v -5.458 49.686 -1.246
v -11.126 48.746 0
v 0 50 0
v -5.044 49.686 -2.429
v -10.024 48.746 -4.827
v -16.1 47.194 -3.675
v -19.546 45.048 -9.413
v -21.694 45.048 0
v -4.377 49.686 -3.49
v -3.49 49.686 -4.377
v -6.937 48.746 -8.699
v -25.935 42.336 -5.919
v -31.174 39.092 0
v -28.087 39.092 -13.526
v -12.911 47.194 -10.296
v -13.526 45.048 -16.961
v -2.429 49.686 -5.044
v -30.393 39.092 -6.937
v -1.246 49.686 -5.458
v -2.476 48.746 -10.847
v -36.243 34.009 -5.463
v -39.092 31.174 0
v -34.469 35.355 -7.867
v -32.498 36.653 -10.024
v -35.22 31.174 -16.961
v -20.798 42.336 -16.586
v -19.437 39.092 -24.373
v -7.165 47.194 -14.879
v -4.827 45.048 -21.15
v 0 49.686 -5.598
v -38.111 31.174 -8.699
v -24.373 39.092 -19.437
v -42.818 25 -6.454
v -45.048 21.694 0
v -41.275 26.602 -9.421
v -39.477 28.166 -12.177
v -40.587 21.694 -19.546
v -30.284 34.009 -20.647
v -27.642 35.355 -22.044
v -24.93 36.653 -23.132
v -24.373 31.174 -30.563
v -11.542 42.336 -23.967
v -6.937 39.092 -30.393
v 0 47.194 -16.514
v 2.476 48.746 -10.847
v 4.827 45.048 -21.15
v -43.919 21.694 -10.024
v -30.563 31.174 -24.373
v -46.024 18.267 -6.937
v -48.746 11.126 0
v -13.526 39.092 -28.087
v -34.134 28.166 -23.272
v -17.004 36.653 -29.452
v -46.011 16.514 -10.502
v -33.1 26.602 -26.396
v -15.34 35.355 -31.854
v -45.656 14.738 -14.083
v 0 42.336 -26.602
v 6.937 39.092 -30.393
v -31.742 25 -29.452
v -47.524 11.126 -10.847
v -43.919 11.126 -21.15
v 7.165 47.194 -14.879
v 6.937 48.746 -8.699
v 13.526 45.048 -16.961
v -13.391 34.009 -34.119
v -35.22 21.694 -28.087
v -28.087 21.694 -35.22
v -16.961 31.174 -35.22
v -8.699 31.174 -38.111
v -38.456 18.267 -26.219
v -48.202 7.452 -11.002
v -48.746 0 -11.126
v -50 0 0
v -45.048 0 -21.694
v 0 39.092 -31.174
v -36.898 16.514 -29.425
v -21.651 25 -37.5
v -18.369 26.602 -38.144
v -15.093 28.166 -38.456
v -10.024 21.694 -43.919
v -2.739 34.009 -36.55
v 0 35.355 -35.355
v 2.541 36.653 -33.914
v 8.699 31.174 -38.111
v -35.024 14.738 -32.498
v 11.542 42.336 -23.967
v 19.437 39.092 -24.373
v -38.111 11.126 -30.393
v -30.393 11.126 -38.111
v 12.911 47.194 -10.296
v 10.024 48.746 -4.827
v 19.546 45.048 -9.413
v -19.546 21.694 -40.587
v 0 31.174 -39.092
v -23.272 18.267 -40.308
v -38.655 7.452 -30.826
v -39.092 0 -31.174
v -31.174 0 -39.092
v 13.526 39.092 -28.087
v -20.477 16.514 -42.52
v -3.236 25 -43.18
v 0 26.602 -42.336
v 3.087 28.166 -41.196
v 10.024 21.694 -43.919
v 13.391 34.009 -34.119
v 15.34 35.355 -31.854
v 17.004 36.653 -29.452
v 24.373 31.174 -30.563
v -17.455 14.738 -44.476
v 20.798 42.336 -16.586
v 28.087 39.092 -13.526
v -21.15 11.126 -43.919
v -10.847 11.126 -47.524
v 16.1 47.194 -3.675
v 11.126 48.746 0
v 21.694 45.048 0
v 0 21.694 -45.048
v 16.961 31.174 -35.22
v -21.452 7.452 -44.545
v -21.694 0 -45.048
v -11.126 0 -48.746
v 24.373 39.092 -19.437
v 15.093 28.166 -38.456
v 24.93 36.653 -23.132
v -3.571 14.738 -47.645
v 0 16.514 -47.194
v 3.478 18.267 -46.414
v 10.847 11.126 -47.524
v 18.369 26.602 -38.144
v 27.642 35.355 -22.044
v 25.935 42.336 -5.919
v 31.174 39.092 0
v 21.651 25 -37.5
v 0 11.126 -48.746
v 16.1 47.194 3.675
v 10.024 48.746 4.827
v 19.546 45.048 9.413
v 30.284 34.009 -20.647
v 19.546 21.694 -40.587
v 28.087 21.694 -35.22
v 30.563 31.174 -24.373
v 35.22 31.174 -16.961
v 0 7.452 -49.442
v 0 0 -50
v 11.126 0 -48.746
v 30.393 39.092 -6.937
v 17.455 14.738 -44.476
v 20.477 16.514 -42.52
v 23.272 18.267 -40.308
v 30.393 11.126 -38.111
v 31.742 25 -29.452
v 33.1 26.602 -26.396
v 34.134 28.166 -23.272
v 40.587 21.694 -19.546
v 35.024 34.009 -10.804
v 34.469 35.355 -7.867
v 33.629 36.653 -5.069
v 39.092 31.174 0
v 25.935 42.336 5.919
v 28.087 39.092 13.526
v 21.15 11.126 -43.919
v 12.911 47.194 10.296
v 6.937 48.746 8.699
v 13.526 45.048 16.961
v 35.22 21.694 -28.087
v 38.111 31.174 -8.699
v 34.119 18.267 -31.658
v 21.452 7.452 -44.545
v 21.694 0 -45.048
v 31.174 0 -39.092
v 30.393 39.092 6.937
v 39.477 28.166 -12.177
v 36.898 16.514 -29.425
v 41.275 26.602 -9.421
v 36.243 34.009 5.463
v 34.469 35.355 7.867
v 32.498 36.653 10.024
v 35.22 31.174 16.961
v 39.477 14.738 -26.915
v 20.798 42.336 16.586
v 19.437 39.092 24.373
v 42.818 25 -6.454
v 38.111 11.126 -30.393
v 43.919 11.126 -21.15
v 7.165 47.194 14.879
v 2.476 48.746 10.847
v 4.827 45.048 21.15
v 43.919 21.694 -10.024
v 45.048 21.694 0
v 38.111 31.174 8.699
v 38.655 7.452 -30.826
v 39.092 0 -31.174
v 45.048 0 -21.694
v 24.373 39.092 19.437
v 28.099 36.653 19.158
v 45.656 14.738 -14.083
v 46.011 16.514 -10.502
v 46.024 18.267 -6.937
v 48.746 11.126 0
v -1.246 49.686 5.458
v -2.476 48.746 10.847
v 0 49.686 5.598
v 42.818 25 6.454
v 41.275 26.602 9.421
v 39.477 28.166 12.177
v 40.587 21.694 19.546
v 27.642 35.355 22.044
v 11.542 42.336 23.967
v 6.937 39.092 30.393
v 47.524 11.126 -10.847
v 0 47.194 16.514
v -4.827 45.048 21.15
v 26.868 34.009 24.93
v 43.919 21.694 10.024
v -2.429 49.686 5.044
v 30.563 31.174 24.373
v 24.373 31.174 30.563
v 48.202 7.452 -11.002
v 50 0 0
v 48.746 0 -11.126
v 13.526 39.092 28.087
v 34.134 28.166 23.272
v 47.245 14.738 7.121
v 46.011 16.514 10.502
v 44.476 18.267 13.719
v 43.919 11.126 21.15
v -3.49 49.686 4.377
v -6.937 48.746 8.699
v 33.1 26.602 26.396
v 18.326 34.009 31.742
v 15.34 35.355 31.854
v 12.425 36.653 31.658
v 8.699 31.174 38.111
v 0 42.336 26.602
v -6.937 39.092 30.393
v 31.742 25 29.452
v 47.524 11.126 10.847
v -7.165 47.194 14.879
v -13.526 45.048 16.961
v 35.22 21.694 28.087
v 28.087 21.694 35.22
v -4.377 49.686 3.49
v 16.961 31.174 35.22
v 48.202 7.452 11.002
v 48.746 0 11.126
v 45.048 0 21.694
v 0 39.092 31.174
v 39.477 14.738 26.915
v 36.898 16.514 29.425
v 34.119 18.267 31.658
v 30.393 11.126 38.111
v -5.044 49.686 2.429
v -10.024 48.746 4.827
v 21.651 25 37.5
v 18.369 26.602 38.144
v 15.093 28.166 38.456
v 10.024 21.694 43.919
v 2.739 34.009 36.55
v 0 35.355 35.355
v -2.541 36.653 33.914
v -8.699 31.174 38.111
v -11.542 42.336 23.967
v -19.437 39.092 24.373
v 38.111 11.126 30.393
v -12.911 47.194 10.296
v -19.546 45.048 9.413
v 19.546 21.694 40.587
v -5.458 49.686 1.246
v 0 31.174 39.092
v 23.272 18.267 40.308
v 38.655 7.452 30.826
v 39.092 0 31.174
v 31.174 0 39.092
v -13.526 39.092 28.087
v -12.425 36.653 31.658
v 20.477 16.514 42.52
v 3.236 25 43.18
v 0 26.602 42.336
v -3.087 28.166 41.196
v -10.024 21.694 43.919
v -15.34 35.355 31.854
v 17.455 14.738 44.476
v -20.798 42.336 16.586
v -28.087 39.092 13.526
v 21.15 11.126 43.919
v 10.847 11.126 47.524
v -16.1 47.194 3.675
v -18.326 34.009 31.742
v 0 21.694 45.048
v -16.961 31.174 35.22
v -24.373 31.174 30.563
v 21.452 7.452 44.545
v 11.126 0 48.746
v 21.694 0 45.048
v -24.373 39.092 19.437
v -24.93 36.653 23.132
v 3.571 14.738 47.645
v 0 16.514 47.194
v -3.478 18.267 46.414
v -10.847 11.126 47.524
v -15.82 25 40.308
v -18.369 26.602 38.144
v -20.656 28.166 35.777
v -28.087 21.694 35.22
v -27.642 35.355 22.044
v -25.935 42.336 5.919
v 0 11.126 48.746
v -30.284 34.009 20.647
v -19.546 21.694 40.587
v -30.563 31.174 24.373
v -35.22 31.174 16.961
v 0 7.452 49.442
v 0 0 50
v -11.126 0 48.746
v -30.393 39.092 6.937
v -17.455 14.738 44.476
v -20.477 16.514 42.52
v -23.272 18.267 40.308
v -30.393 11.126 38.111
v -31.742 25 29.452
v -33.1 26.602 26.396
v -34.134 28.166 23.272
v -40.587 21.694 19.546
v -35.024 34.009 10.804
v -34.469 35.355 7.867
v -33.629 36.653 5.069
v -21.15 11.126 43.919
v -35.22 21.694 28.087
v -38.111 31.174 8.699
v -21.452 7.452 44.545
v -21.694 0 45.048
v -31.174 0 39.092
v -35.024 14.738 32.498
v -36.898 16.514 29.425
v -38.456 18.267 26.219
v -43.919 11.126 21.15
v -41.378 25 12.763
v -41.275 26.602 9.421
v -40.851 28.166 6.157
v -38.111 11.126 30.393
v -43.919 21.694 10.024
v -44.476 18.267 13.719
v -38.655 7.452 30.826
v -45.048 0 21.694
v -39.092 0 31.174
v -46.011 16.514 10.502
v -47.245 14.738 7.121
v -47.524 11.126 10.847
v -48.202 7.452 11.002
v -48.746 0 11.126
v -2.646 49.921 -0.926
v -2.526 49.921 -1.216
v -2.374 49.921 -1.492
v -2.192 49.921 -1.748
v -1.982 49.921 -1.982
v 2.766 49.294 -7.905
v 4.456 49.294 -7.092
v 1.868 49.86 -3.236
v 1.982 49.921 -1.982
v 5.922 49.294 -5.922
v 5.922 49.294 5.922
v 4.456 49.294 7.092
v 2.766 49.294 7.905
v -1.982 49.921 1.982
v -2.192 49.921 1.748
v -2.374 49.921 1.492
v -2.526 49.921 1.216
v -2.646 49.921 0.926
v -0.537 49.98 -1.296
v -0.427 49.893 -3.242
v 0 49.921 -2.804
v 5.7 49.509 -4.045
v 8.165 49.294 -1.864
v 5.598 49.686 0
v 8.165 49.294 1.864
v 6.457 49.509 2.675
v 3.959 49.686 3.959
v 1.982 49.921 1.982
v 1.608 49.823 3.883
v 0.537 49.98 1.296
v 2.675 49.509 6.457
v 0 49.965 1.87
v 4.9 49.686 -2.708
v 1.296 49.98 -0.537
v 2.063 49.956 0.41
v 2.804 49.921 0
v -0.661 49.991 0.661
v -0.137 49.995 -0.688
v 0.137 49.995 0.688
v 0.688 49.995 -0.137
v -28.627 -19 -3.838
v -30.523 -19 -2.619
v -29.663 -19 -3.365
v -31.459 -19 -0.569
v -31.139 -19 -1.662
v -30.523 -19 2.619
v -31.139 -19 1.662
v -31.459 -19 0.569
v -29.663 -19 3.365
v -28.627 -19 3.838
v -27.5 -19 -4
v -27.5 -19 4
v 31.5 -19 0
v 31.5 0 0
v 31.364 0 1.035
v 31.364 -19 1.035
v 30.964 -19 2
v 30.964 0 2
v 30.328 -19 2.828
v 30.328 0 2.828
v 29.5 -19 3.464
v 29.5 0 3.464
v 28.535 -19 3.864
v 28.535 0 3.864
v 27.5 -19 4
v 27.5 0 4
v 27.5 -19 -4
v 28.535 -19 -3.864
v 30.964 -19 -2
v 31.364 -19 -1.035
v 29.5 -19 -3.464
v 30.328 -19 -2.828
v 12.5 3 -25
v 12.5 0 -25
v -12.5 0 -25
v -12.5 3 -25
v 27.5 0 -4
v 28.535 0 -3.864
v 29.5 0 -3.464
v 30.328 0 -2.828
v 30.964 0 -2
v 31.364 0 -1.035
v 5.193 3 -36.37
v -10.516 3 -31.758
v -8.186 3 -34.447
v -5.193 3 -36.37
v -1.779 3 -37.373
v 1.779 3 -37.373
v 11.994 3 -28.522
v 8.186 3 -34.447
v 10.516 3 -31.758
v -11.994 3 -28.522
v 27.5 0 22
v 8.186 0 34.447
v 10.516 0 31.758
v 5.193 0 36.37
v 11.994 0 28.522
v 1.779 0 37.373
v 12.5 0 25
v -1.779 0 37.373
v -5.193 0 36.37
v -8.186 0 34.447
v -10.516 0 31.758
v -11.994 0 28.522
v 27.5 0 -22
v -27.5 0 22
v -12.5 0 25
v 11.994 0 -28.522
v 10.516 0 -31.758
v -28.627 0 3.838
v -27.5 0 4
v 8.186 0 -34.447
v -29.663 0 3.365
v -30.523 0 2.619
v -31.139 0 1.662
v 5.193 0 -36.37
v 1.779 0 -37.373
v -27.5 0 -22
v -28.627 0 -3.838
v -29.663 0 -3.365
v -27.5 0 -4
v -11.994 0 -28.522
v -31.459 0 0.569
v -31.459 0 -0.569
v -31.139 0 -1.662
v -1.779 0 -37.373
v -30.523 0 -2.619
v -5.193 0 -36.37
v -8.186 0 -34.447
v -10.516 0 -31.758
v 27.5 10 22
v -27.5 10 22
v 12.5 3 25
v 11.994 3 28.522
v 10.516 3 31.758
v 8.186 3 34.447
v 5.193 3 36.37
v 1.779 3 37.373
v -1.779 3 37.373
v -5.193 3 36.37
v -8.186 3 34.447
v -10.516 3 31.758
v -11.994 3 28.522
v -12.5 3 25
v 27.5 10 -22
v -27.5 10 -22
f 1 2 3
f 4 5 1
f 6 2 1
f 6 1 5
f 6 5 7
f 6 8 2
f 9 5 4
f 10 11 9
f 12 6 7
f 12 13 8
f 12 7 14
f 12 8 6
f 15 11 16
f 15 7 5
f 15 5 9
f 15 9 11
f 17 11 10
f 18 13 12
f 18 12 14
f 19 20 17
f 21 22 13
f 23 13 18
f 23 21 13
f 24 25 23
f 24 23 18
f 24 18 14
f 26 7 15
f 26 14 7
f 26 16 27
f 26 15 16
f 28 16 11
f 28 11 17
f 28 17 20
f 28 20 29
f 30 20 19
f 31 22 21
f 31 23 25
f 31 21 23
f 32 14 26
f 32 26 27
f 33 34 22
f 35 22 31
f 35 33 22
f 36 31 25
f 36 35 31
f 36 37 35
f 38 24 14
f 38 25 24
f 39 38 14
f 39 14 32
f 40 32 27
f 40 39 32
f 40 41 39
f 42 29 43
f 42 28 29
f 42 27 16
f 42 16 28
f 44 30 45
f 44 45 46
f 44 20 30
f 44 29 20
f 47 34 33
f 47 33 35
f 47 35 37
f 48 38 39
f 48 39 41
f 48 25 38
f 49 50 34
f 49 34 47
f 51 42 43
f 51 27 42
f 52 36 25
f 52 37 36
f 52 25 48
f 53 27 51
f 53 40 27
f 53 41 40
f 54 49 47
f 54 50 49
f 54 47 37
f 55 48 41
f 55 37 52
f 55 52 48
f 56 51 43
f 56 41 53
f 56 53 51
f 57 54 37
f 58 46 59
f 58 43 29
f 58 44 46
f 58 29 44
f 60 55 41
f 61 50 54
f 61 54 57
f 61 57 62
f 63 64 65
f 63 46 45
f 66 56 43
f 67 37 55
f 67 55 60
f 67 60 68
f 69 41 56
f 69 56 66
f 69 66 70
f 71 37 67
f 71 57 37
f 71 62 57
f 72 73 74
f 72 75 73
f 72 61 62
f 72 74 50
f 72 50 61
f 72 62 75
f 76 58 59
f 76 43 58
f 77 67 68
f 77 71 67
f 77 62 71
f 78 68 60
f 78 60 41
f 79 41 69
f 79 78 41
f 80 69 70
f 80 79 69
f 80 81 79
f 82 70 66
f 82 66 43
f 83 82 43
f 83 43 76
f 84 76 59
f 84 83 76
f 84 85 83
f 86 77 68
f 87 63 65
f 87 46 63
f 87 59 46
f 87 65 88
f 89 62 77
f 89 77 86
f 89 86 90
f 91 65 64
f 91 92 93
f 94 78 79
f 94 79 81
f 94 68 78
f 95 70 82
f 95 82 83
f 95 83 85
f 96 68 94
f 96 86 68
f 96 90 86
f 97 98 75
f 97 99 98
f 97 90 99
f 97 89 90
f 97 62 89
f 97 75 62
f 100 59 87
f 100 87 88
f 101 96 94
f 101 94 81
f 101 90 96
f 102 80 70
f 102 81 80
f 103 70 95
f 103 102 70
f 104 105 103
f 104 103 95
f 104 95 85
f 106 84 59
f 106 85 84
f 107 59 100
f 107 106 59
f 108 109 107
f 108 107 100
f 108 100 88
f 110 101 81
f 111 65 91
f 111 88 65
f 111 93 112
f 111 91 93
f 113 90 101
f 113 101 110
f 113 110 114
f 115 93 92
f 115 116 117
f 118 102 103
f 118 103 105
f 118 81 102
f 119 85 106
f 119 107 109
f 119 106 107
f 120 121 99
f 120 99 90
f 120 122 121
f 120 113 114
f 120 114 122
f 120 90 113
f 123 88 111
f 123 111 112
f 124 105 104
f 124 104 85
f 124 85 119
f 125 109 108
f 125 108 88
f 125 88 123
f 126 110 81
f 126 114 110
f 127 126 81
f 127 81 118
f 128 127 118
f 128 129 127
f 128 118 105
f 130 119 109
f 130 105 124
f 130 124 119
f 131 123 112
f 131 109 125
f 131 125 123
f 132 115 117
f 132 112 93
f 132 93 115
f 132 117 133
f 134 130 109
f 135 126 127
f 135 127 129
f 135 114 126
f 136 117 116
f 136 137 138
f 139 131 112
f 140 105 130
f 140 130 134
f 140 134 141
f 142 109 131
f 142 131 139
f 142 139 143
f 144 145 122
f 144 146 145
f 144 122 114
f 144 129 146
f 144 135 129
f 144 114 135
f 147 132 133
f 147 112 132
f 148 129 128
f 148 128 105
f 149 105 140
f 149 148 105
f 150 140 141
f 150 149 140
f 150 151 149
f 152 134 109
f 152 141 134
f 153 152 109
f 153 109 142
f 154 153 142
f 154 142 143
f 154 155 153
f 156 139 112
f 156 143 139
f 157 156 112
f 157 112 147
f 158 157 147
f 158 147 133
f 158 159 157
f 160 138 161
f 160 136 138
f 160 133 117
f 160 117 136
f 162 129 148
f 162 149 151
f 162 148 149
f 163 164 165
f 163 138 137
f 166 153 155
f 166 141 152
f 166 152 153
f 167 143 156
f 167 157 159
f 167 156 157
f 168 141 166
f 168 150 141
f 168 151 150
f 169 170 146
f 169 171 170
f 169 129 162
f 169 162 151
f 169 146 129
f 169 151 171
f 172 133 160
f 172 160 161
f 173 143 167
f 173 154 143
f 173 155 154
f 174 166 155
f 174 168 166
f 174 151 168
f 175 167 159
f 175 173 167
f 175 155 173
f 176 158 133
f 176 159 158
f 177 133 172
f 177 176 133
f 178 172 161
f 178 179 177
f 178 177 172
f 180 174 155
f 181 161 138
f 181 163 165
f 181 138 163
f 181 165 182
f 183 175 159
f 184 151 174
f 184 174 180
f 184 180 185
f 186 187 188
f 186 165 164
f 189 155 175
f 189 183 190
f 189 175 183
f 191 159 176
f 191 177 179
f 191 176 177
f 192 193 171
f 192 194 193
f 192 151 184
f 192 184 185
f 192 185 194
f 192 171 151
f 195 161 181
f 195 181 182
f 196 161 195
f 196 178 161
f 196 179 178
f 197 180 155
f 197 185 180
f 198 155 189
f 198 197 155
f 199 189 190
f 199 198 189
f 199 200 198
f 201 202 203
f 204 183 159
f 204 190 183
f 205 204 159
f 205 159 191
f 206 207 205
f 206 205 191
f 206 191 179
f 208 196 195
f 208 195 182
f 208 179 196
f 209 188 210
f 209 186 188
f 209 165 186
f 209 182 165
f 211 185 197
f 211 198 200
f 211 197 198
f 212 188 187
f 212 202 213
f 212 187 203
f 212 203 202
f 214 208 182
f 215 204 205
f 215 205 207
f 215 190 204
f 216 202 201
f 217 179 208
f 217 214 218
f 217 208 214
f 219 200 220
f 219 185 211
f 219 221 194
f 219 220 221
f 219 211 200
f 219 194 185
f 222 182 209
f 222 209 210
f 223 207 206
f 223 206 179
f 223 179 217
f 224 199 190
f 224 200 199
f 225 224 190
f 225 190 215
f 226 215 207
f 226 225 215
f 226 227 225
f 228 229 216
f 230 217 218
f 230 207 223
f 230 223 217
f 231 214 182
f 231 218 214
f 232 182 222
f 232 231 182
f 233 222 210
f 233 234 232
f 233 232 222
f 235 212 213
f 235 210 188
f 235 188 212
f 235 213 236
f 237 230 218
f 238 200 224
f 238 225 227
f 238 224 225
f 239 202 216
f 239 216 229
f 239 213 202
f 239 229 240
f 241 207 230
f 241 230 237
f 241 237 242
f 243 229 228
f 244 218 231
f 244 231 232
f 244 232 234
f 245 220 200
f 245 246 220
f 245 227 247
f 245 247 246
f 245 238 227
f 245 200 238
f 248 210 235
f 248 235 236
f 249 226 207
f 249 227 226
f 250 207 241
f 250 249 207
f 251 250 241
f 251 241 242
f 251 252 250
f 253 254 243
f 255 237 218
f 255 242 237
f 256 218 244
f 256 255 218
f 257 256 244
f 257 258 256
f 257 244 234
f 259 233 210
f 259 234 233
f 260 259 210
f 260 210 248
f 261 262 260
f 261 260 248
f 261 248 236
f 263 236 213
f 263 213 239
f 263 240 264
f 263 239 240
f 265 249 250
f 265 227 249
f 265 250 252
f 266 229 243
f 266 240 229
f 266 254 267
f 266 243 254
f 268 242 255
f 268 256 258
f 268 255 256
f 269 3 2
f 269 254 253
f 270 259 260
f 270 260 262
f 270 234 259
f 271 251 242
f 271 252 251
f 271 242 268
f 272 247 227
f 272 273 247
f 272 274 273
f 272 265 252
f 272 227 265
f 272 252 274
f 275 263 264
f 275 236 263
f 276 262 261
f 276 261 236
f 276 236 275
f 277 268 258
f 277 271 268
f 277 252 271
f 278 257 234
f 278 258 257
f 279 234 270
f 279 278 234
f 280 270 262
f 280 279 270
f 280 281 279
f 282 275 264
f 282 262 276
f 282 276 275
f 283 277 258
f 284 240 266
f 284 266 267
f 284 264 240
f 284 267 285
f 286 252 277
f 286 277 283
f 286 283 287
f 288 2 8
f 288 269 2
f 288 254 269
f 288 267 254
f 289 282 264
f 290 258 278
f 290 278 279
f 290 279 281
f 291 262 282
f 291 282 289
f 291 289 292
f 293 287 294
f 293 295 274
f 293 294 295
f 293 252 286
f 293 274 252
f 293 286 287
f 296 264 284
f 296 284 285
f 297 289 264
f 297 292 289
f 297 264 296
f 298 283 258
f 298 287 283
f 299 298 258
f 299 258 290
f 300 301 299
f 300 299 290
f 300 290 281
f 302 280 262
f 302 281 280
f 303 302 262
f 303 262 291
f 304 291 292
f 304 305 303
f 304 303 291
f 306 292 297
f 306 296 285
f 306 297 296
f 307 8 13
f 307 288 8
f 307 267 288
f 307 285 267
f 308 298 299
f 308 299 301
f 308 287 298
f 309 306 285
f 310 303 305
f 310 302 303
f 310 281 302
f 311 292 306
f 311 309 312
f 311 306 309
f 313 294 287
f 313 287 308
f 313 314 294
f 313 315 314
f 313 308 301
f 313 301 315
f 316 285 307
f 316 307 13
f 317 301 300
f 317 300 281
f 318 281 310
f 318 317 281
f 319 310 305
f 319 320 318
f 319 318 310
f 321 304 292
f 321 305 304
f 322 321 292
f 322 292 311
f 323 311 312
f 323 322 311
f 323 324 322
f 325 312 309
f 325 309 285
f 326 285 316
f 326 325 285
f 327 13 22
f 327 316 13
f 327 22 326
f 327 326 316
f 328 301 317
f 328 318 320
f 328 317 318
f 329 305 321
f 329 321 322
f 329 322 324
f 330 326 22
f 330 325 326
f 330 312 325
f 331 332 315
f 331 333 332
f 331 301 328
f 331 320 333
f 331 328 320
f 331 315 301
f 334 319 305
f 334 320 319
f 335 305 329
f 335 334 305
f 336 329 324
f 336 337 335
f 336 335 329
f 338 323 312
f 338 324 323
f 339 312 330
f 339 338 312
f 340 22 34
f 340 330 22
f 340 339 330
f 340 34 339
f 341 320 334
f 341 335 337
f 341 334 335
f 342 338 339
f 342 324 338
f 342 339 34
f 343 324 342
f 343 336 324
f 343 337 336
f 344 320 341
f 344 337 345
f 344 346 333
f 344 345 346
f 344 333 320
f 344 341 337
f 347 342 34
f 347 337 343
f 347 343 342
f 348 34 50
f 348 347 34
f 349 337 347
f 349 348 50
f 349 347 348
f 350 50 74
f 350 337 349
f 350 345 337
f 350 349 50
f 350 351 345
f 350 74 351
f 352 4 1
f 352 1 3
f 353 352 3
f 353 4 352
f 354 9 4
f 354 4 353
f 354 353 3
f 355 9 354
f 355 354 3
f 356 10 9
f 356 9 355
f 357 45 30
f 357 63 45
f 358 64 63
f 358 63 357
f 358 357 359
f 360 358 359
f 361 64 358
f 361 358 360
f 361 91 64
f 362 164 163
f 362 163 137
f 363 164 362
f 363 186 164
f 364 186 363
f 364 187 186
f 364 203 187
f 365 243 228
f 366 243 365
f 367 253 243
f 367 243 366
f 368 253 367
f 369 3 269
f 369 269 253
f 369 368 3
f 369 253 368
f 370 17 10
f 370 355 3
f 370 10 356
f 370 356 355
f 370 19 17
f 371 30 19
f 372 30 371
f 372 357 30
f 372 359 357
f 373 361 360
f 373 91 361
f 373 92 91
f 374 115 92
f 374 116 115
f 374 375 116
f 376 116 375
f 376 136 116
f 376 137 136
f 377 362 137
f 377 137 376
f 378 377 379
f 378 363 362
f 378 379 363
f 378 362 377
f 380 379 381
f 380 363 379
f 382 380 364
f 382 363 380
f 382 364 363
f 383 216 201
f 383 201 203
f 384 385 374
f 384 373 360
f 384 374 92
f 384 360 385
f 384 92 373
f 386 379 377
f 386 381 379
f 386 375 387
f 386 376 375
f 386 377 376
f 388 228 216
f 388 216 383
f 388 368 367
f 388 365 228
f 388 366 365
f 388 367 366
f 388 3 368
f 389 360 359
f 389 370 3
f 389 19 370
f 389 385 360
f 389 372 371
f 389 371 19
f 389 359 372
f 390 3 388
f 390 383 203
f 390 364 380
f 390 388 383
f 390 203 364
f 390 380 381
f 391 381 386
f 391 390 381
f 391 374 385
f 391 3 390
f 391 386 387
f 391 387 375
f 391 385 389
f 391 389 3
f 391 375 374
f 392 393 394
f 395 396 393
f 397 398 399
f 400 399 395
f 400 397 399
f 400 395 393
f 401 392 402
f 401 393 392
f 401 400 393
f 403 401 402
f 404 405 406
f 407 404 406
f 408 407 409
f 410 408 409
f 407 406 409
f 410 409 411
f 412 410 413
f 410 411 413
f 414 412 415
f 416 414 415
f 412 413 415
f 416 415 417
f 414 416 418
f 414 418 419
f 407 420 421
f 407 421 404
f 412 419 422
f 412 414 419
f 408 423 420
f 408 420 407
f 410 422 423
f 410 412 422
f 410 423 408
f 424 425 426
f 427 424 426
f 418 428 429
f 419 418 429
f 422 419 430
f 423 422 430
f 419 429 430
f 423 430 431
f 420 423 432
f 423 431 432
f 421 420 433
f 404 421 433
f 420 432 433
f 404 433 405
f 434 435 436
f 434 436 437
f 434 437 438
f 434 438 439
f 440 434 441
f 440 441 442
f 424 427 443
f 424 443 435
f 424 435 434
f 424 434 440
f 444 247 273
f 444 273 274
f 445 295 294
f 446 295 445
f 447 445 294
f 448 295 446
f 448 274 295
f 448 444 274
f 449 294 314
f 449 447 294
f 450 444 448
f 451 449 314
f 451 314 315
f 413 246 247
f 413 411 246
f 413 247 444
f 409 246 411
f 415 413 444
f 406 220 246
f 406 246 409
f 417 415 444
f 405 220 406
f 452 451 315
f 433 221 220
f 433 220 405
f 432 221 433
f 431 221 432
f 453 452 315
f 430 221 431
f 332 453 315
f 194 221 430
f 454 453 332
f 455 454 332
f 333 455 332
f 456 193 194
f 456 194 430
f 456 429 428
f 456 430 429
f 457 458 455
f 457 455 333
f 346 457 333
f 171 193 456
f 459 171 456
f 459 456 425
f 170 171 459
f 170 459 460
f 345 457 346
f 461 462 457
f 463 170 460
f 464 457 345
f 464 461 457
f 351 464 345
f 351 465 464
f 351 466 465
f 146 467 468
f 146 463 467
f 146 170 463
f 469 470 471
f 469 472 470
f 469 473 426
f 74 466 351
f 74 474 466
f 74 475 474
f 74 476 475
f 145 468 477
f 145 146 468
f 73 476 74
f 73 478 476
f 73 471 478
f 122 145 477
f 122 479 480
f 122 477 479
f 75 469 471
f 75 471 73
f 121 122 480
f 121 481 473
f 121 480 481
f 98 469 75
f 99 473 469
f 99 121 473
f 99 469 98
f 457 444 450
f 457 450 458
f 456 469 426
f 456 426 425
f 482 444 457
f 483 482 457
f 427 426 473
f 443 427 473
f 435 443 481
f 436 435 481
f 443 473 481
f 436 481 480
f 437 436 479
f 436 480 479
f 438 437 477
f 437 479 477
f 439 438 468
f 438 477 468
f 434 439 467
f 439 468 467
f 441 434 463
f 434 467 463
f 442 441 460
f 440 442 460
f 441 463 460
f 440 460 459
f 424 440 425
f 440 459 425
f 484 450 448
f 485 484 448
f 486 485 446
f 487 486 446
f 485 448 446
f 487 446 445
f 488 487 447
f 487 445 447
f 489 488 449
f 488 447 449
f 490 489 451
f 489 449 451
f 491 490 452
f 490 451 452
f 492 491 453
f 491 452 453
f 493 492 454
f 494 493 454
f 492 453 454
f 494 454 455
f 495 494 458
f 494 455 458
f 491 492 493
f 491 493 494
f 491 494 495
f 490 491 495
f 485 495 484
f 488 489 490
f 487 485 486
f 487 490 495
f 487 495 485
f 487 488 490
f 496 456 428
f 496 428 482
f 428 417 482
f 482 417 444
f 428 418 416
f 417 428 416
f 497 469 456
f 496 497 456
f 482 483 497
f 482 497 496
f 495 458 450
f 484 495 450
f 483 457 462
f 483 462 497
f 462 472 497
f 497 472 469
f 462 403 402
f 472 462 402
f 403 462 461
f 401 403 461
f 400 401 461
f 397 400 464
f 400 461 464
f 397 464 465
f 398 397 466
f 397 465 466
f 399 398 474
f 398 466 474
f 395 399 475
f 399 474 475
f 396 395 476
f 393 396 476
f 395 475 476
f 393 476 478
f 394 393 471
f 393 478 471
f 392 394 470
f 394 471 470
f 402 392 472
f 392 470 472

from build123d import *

# Parameters (mm, degrees)
F3_DEPTH = 10
F5_DEPTH = 3
F7_DEPTH = 19


with BuildPart() as f1:
    # F0 (on Top) → F1 (revolve)
    with BuildSketch(Plane.XY):
        with BuildLine():
            Line((0, 0), (0, 50))
            ThreePointArc((0, 50), (-35.355339, 35.355339), (-50, 0))
            Line((-50, 0), (0, 0))
        make_face()
    revolve(axis=Axis((0, 25, 0), (0, -1, 0)))

    # F2 (on Front) → F3 (cut)
    with BuildSketch(Plane.XZ):
        Polygon((27.5, 22), (-27.5, 22), (-27.5, 4), (-27.5, -4), (-27.5, -22), (27.5, -22), (27.5, -4), (27.5, 4), align=None)
    extrude(amount=-F3_DEPTH, mode=Mode.SUBTRACT)

    # F4 (on Front) → F5 (cut)
    with BuildSketch(Plane.XZ):
        with BuildLine():
            Line((12.5, -25), (0, -25))
            Line((0, -25), (-12.5, -25))
            ThreePointArc((-12.5, -25), (0, -37.5), (12.5, -25))
        make_face()
        with BuildLine():
            Line((-12.5, 25), (0, 25))
            Line((0, 25), (12.5, 25))
            ThreePointArc((12.5, 25), (0, 37.5), (-12.5, 25))
        make_face()
    extrude(amount=-F5_DEPTH, mode=Mode.SUBTRACT)

    # F6 (on Front) → F7 (join)
    with BuildSketch(Plane.XZ):
        with BuildLine():
            Line((-27.5, 0), (-27.5, 4))
            ThreePointArc((-27.5, 4), (-31.5, 0), (-27.5, -4))
            Line((-27.5, -4), (-27.5, 0))
        make_face()
        with BuildLine():
            ThreePointArc((31.5, 0), (30.328427, 2.828427), (27.5, 4))
            Line((27.5, 4), (27.5, 0))
            Line((27.5, 0), (27.5, -4))
            ThreePointArc((27.5, -4), (30.328427, -2.828427), (31.5, 0))
        make_face()
    extrude(amount=F7_DEPTH)


solid = f1.part
